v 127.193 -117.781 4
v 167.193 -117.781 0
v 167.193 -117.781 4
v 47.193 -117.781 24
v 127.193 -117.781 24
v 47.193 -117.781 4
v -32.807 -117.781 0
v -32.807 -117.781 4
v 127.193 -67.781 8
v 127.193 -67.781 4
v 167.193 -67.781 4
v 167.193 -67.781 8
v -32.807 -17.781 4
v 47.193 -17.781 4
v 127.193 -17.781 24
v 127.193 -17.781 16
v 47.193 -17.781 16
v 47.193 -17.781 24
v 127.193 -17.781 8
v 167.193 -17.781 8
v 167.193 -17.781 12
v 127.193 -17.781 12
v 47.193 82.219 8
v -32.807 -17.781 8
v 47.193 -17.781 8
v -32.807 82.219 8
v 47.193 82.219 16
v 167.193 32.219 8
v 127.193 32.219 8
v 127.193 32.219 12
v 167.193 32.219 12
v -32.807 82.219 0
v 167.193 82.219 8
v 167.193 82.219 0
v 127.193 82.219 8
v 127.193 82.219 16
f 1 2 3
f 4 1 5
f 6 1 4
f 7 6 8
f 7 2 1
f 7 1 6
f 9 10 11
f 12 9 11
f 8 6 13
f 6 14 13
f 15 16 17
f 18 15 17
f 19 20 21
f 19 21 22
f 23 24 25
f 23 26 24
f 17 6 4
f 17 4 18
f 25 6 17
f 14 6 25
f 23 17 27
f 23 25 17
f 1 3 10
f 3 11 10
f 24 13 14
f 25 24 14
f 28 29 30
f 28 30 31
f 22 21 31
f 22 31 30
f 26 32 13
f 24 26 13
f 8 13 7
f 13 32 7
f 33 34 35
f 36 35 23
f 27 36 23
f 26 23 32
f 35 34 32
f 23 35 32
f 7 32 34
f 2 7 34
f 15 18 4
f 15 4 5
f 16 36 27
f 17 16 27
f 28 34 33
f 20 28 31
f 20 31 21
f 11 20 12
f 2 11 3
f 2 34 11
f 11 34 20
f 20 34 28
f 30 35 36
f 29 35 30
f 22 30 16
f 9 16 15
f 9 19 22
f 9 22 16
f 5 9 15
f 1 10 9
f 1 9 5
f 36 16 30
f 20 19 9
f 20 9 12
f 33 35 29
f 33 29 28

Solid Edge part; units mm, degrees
sketch "Sketch1" plane through (0, 0, 0) normal (0, 0, 1) x (1, 0, 0)
  line L0 (-32.807, 82.2191) -> (-32.807, -17.7809)
  line L1 (-32.807, -17.7809) -> (47.193, -17.7809)
  line L2 (47.193, -17.7809) -> (47.193, 82.2191)
  line L3 (47.193, 82.2191) -> (-32.807, 82.2191)
extrude "Protrusion1" add sketch "Sketch1" along normal blind 8
sketch "Sketch2" plane through (0, 0, 0) normal (0, 0, 1) x (1, 0, 0)
  line L0 (-32.807, -117.7809) -> (-32.807, -17.7809)
  line L1 (-32.807, -17.7809) -> (47.193, -17.7809)
  line L2 (47.193, -17.7809) -> (47.193, -117.7809)
  line L3 (47.193, -117.7809) -> (-32.807, -117.7809)
extrude "ExtrudedProtrusion_2" add sketch "Sketch2" along normal blind 4
sketch "Sketch3" plane through (0, 0, 0) normal (0, 0, 1) x (1, 0, 0)
  line L0 (47.193, 82.2191) -> (127.193, 82.2191)
  line L1 (127.193, 82.2191) -> (127.193, -17.7809)
  line L2 (127.193, -17.7809) -> (47.193, -17.7809)
  line L3 (47.193, -17.7809) -> (47.193, 82.2191)
extrude "ExtrudedProtrusion_3" add sketch "Sketch3" along normal blind 16
sketch "Sketch4" plane through (0, 0, 0) normal (0, 0, 1) x (1, 0, 0)
  line L0 (47.193, -117.7809) -> (127.193, -117.7809)
  line L1 (127.193, -117.7809) -> (127.193, -17.7809)
  line L2 (127.193, -17.7809) -> (47.193, -17.7809)
  line L3 (47.193, -17.7809) -> (47.193, -117.7809)
extrude "ExtrudedProtrusion_4" add sketch "Sketch4" along normal blind 24
sketch "Sketch5" plane through (0, 0, 0) normal (0, 0, 1) x (1, 0, 0)
  line L0 (167.193, -117.7809) -> (127.193, -117.7809)
  line L1 (127.193, -117.7809) -> (127.193, -67.7809)
  line L2 (127.193, -67.7809) -> (167.193, -67.7809)
  line L3 (167.193, -67.7809) -> (167.193, -117.7809)
extrude "ExtrudedProtrusion_5" add sketch "Sketch5" along normal blind 4
sketch "Sketch6" plane through (0, 0, 0) normal (0, 0, 1) x (1, 0, 0)
  line L0 (127.193, -67.7809) -> (167.193, -67.7809)
  line L1 (167.193, -67.7809) -> (167.193, -17.7809)
  line L2 (167.193, -17.7809) -> (127.193, -17.7809)
  line L3 (127.193, -17.7809) -> (127.193, -67.7809)
extrude "ExtrudedProtrusion_6" add sketch "Sketch6" along normal blind 8
sketch "Sketch7" plane through (0, 0, 0) normal (0, 0, 1) x (1, 0, 0)
  line L0 (167.193, -17.7809) -> (127.193, -17.7809)
  line L1 (127.193, -17.7809) -> (127.193, 32.2191)
  line L2 (127.193, 32.2191) -> (167.193, 32.2191)
  line L3 (167.193, 32.2191) -> (167.193, -17.7809)
extrude "ExtrudedProtrusion_7" add sketch "Sketch7" along normal blind 12
sketch "Sketch8" plane through (0, 0, 0) normal (0, 0, 1) x (1, 0, 0)
  line L0 (127.193, 32.2191) -> (167.193, 32.2191)
  line L1 (167.193, 32.2191) -> (167.193, 82.2191)
  line L2 (167.193, 82.2191) -> (127.193, 82.2191)
  line L3 (127.193, 82.2191) -> (127.193, 32.2191)
extrude "ExtrudedProtrusion_8" add sketch "Sketch8" along normal blind 8
